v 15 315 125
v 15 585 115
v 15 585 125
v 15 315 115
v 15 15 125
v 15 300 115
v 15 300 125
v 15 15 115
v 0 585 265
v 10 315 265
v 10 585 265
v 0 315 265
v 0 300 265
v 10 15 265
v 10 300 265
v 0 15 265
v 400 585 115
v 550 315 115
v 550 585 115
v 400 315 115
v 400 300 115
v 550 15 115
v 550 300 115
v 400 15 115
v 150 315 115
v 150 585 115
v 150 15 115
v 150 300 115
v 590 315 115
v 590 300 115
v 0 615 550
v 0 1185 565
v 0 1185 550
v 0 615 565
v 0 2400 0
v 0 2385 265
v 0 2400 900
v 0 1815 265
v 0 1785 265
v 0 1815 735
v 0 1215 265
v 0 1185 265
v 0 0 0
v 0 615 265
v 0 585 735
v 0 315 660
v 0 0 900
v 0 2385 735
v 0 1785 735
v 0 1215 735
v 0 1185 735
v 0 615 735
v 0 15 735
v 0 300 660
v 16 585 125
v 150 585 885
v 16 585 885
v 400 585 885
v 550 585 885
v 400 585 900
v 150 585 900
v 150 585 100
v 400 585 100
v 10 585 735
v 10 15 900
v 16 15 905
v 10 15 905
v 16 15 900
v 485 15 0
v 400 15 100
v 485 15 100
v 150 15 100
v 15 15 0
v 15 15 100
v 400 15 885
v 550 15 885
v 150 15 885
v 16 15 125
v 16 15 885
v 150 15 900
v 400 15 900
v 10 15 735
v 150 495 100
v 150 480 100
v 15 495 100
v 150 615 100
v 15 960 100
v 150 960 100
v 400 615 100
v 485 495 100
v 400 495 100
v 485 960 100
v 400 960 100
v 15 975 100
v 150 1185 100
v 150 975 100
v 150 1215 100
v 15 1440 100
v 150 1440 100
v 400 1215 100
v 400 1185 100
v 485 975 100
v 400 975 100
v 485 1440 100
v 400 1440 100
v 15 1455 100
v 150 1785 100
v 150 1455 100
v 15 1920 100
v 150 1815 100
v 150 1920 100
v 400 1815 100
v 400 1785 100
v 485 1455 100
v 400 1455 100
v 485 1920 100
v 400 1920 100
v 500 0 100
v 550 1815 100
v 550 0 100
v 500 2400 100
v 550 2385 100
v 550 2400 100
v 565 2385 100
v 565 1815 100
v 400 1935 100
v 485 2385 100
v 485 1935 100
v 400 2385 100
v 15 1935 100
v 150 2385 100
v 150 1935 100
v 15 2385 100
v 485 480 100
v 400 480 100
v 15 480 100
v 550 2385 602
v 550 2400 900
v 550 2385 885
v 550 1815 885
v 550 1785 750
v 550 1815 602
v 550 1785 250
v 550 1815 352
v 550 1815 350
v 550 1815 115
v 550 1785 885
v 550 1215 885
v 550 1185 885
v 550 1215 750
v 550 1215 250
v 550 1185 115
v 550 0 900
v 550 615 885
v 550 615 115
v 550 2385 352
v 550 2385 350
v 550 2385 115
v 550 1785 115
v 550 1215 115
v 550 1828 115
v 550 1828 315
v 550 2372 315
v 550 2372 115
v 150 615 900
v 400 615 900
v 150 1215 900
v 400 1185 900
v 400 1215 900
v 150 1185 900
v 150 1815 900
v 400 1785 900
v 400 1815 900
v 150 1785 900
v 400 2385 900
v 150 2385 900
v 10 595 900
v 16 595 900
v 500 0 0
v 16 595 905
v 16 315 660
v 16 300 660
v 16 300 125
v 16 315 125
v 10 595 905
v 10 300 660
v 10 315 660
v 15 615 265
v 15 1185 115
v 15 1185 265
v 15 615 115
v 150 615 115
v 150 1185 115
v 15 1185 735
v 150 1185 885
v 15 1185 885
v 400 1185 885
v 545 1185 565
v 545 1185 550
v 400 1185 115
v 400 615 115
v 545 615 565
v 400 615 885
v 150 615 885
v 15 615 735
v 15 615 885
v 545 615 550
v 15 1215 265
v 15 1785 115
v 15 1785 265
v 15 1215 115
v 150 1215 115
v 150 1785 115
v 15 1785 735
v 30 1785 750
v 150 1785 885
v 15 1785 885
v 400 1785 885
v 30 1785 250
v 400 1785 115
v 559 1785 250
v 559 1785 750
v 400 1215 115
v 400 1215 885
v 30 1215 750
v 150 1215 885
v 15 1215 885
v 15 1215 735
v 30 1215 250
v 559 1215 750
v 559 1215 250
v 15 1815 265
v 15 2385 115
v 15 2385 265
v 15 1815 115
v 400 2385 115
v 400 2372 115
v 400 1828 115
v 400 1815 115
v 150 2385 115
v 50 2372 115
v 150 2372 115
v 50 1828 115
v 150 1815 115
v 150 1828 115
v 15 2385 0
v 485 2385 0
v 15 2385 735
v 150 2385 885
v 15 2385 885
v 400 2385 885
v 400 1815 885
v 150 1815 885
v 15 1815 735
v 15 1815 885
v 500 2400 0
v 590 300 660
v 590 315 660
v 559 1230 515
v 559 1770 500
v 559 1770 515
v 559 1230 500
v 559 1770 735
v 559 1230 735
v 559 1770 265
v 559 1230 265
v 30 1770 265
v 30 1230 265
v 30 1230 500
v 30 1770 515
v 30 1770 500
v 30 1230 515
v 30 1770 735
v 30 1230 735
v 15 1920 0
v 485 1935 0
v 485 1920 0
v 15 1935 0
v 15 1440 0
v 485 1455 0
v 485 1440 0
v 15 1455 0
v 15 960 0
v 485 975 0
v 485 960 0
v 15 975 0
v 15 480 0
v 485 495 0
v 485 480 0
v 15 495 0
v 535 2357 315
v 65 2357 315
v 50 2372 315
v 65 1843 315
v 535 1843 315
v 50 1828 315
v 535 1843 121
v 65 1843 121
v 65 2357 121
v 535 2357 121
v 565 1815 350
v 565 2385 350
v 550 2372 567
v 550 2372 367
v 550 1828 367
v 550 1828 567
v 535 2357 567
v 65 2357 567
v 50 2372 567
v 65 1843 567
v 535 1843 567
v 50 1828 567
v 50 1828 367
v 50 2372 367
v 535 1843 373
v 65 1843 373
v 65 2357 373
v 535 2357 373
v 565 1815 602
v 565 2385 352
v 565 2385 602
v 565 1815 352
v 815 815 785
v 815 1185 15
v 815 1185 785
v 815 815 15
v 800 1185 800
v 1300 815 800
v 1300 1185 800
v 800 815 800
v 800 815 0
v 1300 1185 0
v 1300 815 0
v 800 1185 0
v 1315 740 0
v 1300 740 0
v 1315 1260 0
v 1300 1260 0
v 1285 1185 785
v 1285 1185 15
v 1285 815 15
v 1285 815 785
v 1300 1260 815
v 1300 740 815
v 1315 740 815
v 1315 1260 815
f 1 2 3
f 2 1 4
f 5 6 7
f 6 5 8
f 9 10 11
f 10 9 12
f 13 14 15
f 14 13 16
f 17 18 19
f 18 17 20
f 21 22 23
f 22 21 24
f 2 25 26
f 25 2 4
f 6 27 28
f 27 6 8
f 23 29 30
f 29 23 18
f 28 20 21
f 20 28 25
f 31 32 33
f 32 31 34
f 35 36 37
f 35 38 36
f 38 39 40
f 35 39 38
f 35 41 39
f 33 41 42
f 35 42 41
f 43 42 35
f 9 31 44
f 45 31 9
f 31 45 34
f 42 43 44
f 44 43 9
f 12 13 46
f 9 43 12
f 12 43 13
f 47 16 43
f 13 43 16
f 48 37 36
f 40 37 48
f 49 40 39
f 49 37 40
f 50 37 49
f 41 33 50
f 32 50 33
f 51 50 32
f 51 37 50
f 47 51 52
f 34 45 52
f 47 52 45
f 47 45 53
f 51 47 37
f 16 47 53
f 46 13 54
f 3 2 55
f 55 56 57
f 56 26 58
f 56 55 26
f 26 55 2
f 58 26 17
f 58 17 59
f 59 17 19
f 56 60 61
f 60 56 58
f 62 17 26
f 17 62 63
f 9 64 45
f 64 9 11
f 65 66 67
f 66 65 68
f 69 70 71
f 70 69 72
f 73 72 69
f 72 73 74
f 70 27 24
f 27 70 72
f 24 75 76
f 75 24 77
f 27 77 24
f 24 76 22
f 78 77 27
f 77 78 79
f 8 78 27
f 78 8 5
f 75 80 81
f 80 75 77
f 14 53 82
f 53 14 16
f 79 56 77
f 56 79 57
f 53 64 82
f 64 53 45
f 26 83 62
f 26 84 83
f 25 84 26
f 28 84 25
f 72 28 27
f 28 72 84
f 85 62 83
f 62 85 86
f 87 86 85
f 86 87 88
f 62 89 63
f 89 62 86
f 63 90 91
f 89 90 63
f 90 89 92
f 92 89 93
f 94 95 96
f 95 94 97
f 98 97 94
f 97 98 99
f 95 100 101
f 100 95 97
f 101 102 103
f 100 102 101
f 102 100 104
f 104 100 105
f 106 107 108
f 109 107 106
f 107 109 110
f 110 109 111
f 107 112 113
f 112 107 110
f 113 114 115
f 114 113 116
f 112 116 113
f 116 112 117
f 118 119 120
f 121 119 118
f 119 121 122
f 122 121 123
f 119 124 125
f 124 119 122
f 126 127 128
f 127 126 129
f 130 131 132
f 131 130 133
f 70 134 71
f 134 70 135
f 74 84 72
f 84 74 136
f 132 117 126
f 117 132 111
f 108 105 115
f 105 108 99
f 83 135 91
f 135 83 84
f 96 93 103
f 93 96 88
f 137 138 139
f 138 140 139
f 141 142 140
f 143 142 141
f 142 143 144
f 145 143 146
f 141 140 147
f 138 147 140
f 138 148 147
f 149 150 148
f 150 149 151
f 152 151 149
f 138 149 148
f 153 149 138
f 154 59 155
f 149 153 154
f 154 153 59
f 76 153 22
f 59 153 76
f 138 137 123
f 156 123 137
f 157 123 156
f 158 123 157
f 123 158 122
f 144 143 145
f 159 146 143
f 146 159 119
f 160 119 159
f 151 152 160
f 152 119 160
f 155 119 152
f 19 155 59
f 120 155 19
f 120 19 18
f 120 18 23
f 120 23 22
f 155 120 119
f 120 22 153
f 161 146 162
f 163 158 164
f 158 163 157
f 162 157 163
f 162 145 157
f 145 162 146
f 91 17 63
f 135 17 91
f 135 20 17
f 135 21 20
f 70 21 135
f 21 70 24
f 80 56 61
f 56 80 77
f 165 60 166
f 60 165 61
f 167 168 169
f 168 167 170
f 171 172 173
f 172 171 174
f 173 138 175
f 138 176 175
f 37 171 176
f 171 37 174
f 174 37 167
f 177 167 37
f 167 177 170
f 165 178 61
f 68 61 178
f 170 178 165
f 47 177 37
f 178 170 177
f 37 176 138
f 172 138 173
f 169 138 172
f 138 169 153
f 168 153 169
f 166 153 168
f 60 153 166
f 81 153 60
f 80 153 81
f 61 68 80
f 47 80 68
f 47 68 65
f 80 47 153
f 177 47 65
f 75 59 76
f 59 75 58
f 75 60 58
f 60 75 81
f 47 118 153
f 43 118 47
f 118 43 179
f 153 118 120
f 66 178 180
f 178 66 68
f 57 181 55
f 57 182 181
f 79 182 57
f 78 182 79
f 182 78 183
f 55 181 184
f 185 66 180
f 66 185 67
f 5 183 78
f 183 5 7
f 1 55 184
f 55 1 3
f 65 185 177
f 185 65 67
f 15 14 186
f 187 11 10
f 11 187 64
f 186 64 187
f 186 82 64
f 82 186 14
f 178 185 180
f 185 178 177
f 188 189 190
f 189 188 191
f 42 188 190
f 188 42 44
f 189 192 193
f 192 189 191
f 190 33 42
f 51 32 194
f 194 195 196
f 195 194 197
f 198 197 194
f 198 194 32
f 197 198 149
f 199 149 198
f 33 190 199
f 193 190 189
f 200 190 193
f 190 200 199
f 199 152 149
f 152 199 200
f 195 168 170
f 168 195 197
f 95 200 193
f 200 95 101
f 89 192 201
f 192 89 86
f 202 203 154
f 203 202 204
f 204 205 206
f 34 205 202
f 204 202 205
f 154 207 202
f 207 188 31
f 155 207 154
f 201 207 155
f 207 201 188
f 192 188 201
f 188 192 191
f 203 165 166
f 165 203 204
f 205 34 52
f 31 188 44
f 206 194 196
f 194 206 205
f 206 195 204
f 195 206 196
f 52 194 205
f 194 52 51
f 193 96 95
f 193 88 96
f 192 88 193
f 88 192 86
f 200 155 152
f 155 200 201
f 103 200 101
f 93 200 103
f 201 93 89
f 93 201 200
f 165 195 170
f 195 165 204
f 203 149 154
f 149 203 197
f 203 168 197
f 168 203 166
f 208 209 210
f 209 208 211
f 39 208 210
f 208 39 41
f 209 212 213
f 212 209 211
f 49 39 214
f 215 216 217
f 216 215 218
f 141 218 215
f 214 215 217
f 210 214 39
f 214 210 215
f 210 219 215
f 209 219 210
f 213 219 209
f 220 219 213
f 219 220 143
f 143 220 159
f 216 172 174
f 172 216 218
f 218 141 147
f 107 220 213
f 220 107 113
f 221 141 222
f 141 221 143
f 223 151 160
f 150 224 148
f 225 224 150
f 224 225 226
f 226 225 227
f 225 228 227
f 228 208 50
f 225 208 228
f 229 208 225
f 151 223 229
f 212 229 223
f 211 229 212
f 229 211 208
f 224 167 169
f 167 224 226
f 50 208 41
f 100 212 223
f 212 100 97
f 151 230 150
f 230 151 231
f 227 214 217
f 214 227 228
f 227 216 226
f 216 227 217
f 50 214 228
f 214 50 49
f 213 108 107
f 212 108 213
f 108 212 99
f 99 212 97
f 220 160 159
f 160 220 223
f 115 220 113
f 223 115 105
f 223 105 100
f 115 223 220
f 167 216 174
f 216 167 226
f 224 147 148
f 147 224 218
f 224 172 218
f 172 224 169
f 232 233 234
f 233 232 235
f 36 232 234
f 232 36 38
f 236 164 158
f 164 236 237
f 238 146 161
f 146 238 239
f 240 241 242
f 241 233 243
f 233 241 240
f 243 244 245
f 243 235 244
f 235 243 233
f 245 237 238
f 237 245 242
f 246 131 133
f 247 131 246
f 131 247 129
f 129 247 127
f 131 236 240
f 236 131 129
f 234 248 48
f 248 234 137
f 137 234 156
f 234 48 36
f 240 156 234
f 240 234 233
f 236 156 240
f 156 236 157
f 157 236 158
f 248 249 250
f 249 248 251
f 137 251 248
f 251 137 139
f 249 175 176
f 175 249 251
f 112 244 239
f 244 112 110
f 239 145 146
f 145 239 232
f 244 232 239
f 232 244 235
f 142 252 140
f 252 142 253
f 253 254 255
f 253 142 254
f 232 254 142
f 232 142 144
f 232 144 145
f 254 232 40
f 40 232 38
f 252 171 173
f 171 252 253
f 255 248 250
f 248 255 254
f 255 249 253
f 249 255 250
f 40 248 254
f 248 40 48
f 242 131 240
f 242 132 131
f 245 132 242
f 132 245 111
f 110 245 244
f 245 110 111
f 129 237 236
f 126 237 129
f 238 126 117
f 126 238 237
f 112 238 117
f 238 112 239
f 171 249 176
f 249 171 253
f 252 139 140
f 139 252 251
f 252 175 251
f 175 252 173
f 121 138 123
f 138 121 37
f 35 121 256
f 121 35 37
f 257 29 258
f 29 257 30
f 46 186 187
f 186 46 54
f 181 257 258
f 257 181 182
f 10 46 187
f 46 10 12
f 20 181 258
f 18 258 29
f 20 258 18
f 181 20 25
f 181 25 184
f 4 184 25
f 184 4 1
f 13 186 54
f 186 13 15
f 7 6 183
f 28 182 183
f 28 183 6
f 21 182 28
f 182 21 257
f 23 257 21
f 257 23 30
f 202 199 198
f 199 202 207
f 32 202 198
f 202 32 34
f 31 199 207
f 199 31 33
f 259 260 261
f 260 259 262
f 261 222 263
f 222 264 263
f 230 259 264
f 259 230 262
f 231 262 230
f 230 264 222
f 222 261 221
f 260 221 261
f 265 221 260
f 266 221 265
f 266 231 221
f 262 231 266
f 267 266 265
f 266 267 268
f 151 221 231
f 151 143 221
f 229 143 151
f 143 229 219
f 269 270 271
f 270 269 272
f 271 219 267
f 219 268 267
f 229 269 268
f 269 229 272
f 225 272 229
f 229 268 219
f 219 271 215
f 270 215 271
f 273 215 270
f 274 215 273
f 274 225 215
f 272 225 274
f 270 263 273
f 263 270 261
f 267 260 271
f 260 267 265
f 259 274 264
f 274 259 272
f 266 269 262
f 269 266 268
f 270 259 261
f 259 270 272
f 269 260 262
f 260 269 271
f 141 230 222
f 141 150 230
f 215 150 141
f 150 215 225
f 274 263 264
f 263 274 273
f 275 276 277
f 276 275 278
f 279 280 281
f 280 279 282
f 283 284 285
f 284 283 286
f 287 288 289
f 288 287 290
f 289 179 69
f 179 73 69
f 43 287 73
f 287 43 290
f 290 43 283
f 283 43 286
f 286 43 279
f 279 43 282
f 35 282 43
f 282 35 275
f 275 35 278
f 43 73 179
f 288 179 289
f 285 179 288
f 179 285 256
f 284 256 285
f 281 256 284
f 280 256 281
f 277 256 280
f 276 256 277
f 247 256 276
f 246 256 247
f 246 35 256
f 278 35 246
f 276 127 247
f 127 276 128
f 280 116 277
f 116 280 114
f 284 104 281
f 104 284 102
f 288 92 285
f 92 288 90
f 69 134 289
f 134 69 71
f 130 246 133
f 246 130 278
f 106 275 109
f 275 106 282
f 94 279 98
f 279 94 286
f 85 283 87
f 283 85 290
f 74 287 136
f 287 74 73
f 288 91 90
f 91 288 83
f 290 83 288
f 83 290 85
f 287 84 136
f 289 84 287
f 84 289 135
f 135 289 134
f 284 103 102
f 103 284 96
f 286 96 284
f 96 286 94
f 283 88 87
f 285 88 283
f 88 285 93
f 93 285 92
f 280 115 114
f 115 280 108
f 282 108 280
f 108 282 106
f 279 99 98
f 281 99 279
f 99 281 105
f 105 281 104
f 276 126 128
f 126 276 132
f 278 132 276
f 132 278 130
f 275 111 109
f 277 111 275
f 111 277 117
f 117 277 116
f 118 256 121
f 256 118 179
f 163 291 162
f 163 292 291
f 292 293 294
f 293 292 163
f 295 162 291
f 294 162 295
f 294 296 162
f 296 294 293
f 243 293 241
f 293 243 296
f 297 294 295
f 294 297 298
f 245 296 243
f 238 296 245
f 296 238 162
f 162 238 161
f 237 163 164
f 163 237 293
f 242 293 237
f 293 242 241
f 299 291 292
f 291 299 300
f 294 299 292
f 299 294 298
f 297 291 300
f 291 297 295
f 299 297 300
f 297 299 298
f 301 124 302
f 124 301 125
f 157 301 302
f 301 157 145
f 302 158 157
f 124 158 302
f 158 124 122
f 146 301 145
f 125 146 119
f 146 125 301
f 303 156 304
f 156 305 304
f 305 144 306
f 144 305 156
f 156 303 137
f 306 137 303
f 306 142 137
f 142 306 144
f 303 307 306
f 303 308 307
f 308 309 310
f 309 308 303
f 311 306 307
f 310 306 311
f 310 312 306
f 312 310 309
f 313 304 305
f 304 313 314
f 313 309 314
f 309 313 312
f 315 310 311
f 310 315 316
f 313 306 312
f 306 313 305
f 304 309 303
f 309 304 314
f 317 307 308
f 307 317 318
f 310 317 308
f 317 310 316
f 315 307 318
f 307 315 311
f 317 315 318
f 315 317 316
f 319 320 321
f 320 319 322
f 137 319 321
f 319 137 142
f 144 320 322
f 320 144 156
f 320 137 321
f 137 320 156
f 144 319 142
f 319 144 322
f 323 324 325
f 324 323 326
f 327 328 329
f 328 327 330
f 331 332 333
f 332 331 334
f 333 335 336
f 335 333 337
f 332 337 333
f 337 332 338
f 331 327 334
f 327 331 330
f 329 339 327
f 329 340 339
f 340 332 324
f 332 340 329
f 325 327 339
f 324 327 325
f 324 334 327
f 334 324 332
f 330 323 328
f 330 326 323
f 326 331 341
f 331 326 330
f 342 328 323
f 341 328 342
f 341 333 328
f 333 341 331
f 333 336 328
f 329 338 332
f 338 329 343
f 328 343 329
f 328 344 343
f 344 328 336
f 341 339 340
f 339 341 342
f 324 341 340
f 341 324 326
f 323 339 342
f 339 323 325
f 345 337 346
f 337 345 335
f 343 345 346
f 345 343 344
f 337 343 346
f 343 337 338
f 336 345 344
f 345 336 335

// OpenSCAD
// modulo = [
//    ancho, alto, profundidad,
//    refuerzo, esqueleto, fondo, espesor,
//    color, [x,y,z], nombre
//]

// puerta = [moduloIndex, cant, espesor, 
//    color, [x,y,z]], nombre
//]

// cajon = [ moduloIndex, alto, color,
//    frenteDec, altoDec, anchoPlus,
//    colorDec, [x,y,z], nombre
//]

module tableroX(ancho=100, alto=100, 
                espesor=15, posicion, color, parte, agrupador = 0 ){ 
    if(is_num(ancho) && is_num(alto) && is_num(espesor)){
        
        if (posicion == "lateral"){  //-- lateral
            cube([ancho, espesor, alto]);       
        }else if(posicion == "fondo"){ //-- frente
            cube([espesor, ancho, alto]);
        }else if(posicion == "frente"){ //-- frente
            cube([espesor, ancho, alto]);
        }else if(posicion == "techo"){ //-- piso
            cube([alto, ancho, espesor]);
        }else if(posicion == "piso"){ //-- piso
            cube([alto, ancho, espesor]);
        }
 
    }else{ echo("No es numero!!!!!"); }
//    echo("tablero", posicion, 1, ancho," x ",alto,
//    espesor, color, parte);
    
    habilitado="true";
    conBanda=color; sinBanda=""; 
    conAluminio="aluminio";
    sinAluminio="";
    
  if (! (parte == "Pared" || 
    parte == "Pilar" || 
    parte == "Frizer" || 
    parte == "Cocina")
  ){
    if((espesor > 10) && 
        (posicion == "piso" 
        || posicion == "techo"
        || posicion == "fondo")){
       echo(alto," ",
        ancho," -- ",
        1,color, 
        str(parte,"_",agrupador,"_",posicion),
        habilitado,
        sinBanda,sinBanda,
        conBanda,sinBanda);
    }else if(espesor < 10 && 
        (posicion == "piso" 
        || posicion == "techo"
        || posicion == "fondo")){
       echo(alto," ",
        ancho," ",
        1,"Fondo 6", 
        str(parte,"_",agrupador,"_",posicion),
        habilitado,
        sinBanda,sinBanda,
        sinBanda,sinBanda); 
        }
    if(posicion == "lateral"){
        echo(alto," -- ",
        ancho," == ",
        1,color,
        str(parte,"_",agrupador,"_",posicion),
        habilitado,
        conBanda,sinBanda,
        conBanda,conBanda);
    }
    if(posicion == "frente" && 
        parte == "Cajón"){
        echo(alto," == ",
        ancho," == ",
        1,color,    
        str(parte,"_",agrupador,"_",posicion),
        habilitado,
        conAluminio,conAluminio,
        sinAluminio,conAluminio);
    }
    if(posicion == "frente" && 
        parte == "Puerta"){
        echo(alto," == ",
        ancho," == ",
        1,color,    
        str(parte,"_",agrupador,"_",posicion),
        habilitado,
        conAluminio,sinAluminio,
        conAluminio,conAluminio);
    }
  }
}

module armariodeModulo(armario){
    
    //echo(armario[8]);
//armario_00 = [moduloIndex, ancho, alto, profundidad,
//            espesor, color, divisiones, [x,y,z]];    
            
    espacio = armario[2]/(armario[6]-1);  t=0;
    translate(armario[7]) color(armario[5])
    union(){
    tableroX(ancho=armario[3],
            alto=armario[2],
            espesor=armario[4],
            posicion="lateral",
            color=armario[5],
            parte=armario[8]);
    translate ([0,armario[1]-(armario[4]),0])
    tableroX(ancho=armario[3],
            alto=armario[2],
            espesor=armario[4],
            posicion="lateral",
            color=armario[5],
            parte=armario[8]);
    for ( n = [0 : armario[6]-2] ){
        translate ([0,armario[4],t])
        tableroX(ancho=armario[1]-(armario[4]*2),
                alto=armario[3],
                espesor=armario[4],
                posicion="piso",
                color=armario[5],
                parte=armario[8]);
        t= n*espacio;
    }
    translate ([0,armario[4],armario[2]-armario[4]])
    tableroX(ancho=armario[1]-(armario[4]*2),
            alto=armario[3],
            espesor=armario[4],
            posicion="piso",
            color=armario[5],
            parte=armario[8]);
    }
}

module socalo(Socalo){
    rotate([0,270,-90])
    armariodeModulo(Socalo);
}

// modulo = [
//    ancho, alto, profundidad,
//    refuerzo, esqueleto, fondo, espesor,
//    color, [x,y,z], nombre
//]

module modularX(anchoMod, altoMod, profundoMod, 
    refuerzo, esqueleto, fondo, espesor, color,
    agrupador){

    altoRefuerzoFrente=50;
    altoRefuerzo = 150;
    anchoFondo=anchoMod-(espesor*2);
    PLat_1=[0,0,0];
    PLat_2=[0,anchoMod-espesor,0];
    PFondo=[0,espesor,espesor];
    PFrente=[profundoMod-espesor,
        espesor,
        altoMod-altoRefuerzoFrente-espesor];
    PPiso=[0,espesor,0];
    PTech=[0,espesor,altoMod-espesor];
    
    union(){
        //--Lateral 1
        translate(PLat_1)
        tableroX(ancho=profundoMod,
            alto=altoMod,
            espesor=espesor,
            posicion="lateral", 
            color=color,
            parte="Modular",
            agrupador=agrupador);        
        //--Lateral 2
        translate(PLat_2)
        tableroX(ancho=profundoMod,
            alto=altoMod,
            espesor=espesor,
            posicion="lateral", 
            color=color,
            parte="Modular",
            agrupador=agrupador);
        //--Frente
        if(refuerzo=="Si"){
            translate(PFrente)
            tableroX(ancho=anchoFondo,
                alto=altoRefuerzoFrente,
                espesor=espesor,
                posicion="frente", 
                color=color,
                parte="Modular",
                agrupador=agrupador);
        }
        //refuerzoF = "No"; refuerzoTP = "No";
//        if(profundoMod > (altoRefuerzo*2)){
//            refuerzoTP = "Si";}
//        if(altoMod > (altoRefuerzo*2)){
//            refuerzoF = "Si";}
        if(esqueleto=="No"){
            //--Fondo
            //if(refuerzoTP == "Si"){
            translate(PFondo) 
            tableroX(ancho=anchoFondo,
                alto=altoRefuerzo,
                espesor=espesor,
                posicion="fondo", 
                color=color,
                parte="Modular",
                agrupador=agrupador);
            translate(PFondo) 
            translate([0,0,altoMod-altoRefuerzo-espesor*2])
            tableroX(ancho=anchoFondo,
                alto=altoRefuerzo,
                espesor=espesor,
                posicion="fondo", 
                color=color,
                parte="Modular",
                agrupador=agrupador);
            //}
            //-- Piso 
            translate(PPiso)
            tableroX(ancho=anchoFondo,
                alto=profundoMod,
                espesor=espesor,
                posicion="piso", 
                color=color,
                parte="Modular",
                agrupador=agrupador);
            //-- techo
            translate(PTech)
            tableroX(ancho=anchoFondo,
                alto=profundoMod,
                espesor=espesor,
                posicion="techo", 
                color=color,
                parte="Modular",
                agrupador=agrupador);
        }
        if(esqueleto == "Si"){ 
        //--Fondo
//            if(refuerzoF == "Si"){
            translate(PFondo) 
            tableroX(ancho=anchoFondo,
                alto=altoRefuerzo,
                espesor=espesor,
                posicion="fondo", 
                color=color,
                parte="Modular",
                agrupador=agrupador);
            translate(PFondo) 
            translate([0,0,altoMod-altoRefuerzo-espesor*2]) 
            tableroX(ancho=anchoFondo,
                alto=altoRefuerzo,
                espesor=espesor,
                posicion="fondo", 
                color=color,
                parte="Modular",
                agrupador=agrupador);
//            }
            //-- Piso
            translate(PPiso)
            tableroX(ancho=anchoFondo,
                alto=altoRefuerzo,
                espesor=espesor,
                posicion="piso", 
                color=color,
                parte="Modular",
                agrupador=agrupador);
                
                translate(PPiso) 
            translate([profundoMod-altoRefuerzo,0,0]) 
            tableroX(ancho=anchoFondo,
                alto=altoRefuerzo,
                espesor=espesor,
                posicion="techo", 
                color=color,
                parte="Modular",
                agrupador=agrupador);
                
            //-- techo
            translate(PTech) 
            tableroX(ancho=anchoFondo,
                alto=altoRefuerzo,
                espesor=espesor,
                posicion="techo", 
                color=color,
                parte="Modular",
                agrupador=agrupador);
            translate(PTech) 
            translate([profundoMod-altoRefuerzo,0,0]) 
            tableroX(ancho=anchoFondo,
                alto=altoRefuerzo,
                espesor=espesor,
                posicion="techo", 
                color=color,
                parte="Modular",
                agrupador=agrupador);
        }
        //En caso de requerir un fondo en el mueble
        if(fondo == "Si"){
            translate(PFondo) 
            translate([espesor-5,0,
                        espesor-5]) 
            tableroX(
              ancho=anchoMod-(espesor+5),
              alto=altoMod-(espesor+5),
                espesor=6,
                posicion="fondo", 
                color=color,
                parte="Modular",
                agrupador=agrupador);    
        }
    }
}

module modulosdeCocina(Modulos){
                            
    // Ensamblado de modulos
    if (len(Modulos) > 0){
        for(i=[0:(len(Modulos)-1)]){
//            echo(str("Modular ",i), 
//            str("Ancho ", Modulos[i][0]),    
//            str("Alto ", Modulos[i][1]),
//            str("Profundidad ", Modulos[i][2]),  
//            str("Nombre ", Modulos[i][9]));
            
            translate(Modulos[i][8]) 
            rotate([0,0,0])
            color(Modulos[i][7])        
            modularX(anchoMod=Modulos[i][0], 
                altoMod=Modulos[i][1], 
                profundoMod=Modulos[i][2], 
                refuerzo=Modulos[i][3],    
                esqueleto=Modulos[i][4],
                fondo=Modulos[i][5],
                espesor=Modulos[i][6],
                color=Modulos[i][7],
                agrupador=i
            );
        }
    }
}

module puertasdeModulo(Puertas){
    // Ensamblado de puertas  
    if (len(Puertas) > 0){   
        for(i=[0:len(Puertas)-1]){
            translate(Puertas[i][6]) 
            color(Puertas[i][5])
            tableroX(ancho=Puertas[i][1],
                alto=Puertas[i][2],
                espesor=Puertas[i][4],
                posicion="frente",
                color=Puertas[i][5],
                parte="Puerta",
                agrupador=i);
        }
    }
}

module cajonX(anchoCajon, altoCajon,
            profundoCajon, espesor, 
            color="green",frente="No",
            altoFrente, anchoPlus,
            colorFrente= "red", agrupador){

            anchoFondo=anchoCajon-(espesor*2);
        
//    //union(){
        //--Lateral 1
        translate([0,0,0]) color(color)
        tableroX(ancho=profundoCajon,
            alto=altoCajon,
            espesor=espesor,
            posicion="lateral", 
            color=color,
            parte="Cajón",
            agrupador=agrupador);
        //--Lateral 2
        translate([0,anchoCajon-espesor,0]) color(color)
        tableroX(ancho=profundoCajon,
            alto=altoCajon,
            espesor=espesor,
            posicion="lateral", 
            color=color,
            parte="Cajón",
            agrupador=agrupador);
              //--Fondo 
        translate([0,espesor,0]) color(color)
        tableroX(ancho=anchoCajon-espesor*2,
            alto=altoCajon,
            espesor=espesor,
            posicion="fondo", 
            color=color,
            parte="Cajón",
            agrupador=agrupador);
        //--Frente
        translate([profundoCajon-espesor,espesor,0]) color(color)
        tableroX(ancho=anchoCajon-espesor*2,
            alto=altoCajon,
            espesor=espesor,
            posicion="fondo", 
            color=color,
            parte="Cajón",
            agrupador=agrupador);
        //-- Piso 
        translate([espesor,espesor,0]) color(color)
        tableroX(
            ancho=anchoCajon-(espesor+5),
            alto=profundoCajon-(espesor+5),
            espesor=6,
            posicion="piso", 
            color=color,
            parte="Cajón",
            agrupador=agrupador);     
    if(frente == "Si"){
      // Frente decorativo
      translate([profundoCajon,(anchoCajon-anchoPlus)/2,-espesor])
        color(colorFrente)
      tableroX(ancho=anchoPlus,
            alto=altoFrente,
            espesor=espesor,
            posicion="frente", 
            color=colorFrente,
            parte="Cajón",
            agrupador=agrupador);
    }
}

module cajonY(anchoCajon, altoCajon, profundoCajon, 
            espesor, color="green",frente="No",
            altoFrente, anchoPlus,colorFrente= "red"){

            anchoFondo=anchoCajon-(espesor*2);
        
        //--Fondo 
        translate([0,espesor,0]) color(color)
        tableroX(ancho=anchoCajon-espesor*2,
            alto=altoCajon,
            espesor=espesor,
            posicion="fondo", 
            color=color,
            parte="Cajón");
        //--Frente
        translate([profundoCajon-espesor,espesor,0]) color(color)
        tableroX(ancho=anchoCajon-espesor*2,
            alto=altoCajon,
            espesor=espesor,
            posicion="fondo", 
            color=color,
            parte="Cajón");
        //-- Piso 
        translate([espesor,espesor,0]) color(color)
        tableroX(
            ancho=anchoCajon-espesor*2,
            alto=profundoCajon-espesor*2,
            espesor=espesor,
            posicion="piso", 
            color=color,
            parte="Cajón");     
       // Techo
       translate([espesor,espesor,altoCajon-espesor]) color(color)
        tableroX(
            ancho=anchoCajon-espesor*2,
            alto=profundoCajon-espesor*2,
            espesor=espesor,
            posicion="piso", 
            color=color,
            parte="Cajón");     
            
    if(frente == "Si"){
      // Frente decorativo
      translate([profundoCajon,(anchoCajon-anchoPlus)/2,0])
        color(colorFrente)
      tableroX(ancho=anchoPlus,
            alto=altoFrente,
            espesor=espesor,
            posicion="frente", 
            color=colorFrente,
            parte="Cajón");
    }
}


// cajon_00 = [moduloIndex, ancho, alto, profundidad,
//          espesor, color, frenteDec, anchoDec, altoDec, 
//          colorDec, [x,y,z]]
module cajonesdeModulo(Cajones){
    
    // Ensamblado de cajones
    for(i=[0:len(Cajones)-1]){
//        echo(str("Cajón ",i), 
//        str("Ancho ",Cajones[i][1]),
//        str("Alto ",Cajones[i][2]),
//        str("Profundidad ",Cajones[i][3]));
        
        translate (Cajones[i][10])  
        cajonX(
            anchoCajon=Cajones[i][1], 
            altoCajon=Cajones[i][2], 
            profundoCajon=Cajones[i][3], 
            espesor=Cajones[i][4],
            color=Cajones[i][5],
            frente=Cajones[i][6],
            altoFrente=Cajones[i][8],
            anchoPlus=Cajones[i][7],
            colorFrente=Cajones[i][9],
            agrupador=i);
    }
}

module divHorizontal(Divisiones){
     
    for(i=[0:len(Divisiones)-1]){
        translate(Divisiones[i][6]) 
        color(Divisiones[i][5])
        tableroX(
          ancho=Divisiones[i][1],
            alto=Divisiones[i][2],
            espesor=Divisiones[i][4],
            posicion="piso",
            color=Divisiones[i][5],
            parte="Division");
    }   
}


module divisiones(Divisiones){     
    for(i=[0:len(Divisiones)-1]){
        translate(Divisiones[i][6]) 
        color(Divisiones[i][5])
        tableroX(
          ancho=Divisiones[i][1],
            alto=Divisiones[i][2],
            espesor=Divisiones[i][4],
            posicion=Divisiones[i][8],
            color=Divisiones[i][5],
            parte="Division");
    }   
}

/////////////////////////////////////
espesor = 15; riel = 13;
socalo = 100;
// modulo(i) = [
//    ancho, alto, profundidad,
//    refuerzo, esqueleto, fondo, espesor,
//    color, [x,y+sum(modulo(i..i-1)[ancho]),z], nombre
//]

mod_00 = [600,800,550,"No","Si","Si",espesor,"red",
         [0,0,socalo], "Modulo 1"];
mod_01 = [600,800,550,"No","Si","No",espesor,"red",
         [0,mod_00[0],socalo], "Modulo 2"];
mod_02 = [600,800,550,"No","Si","No",espesor,"red",
         [0,mod_00[0]+mod_01[0],socalo], "Modulo 3"];
mod_03 = [600,800,550,"No","Si","No",espesor,"red",
         [0,mod_00[0]+mod_01[0]+mod_02[0],socalo], "Modulo 4"];

ModulosX = [mod_00, mod_01, mod_02, mod_03];

// puerta = [moduloIndex, ancho, alto, cant, espesor, 
//    color, [x,y,z]], nombre
//]

puerta_00 = [0,mod_00[0]-10,mod_00[1]-10,1,espesor,"green",
            [mod_00[8][0]+mod_00[2],
                mod_00[8][1]+5,
                mod_00[8][2]], 
            "puerta 1"];
puerta_01 = [1,mod_01[0]-10,mod_01[1]-10,1,espesor,"green",
            [mod_01[8][0]+mod_01[2],
                mod_01[8][1]+5,
                mod_01[8][2]], 
            "puerta 2"];
PuertasX = [
        puerta_00, puerta_01
    ];

div_00 = [0,mod_00[0]-10,mod_00[2]-5,1,espesor,"green",
            [mod_00[8][0],
                mod_00[8][1]+mod_00[0]/2,
                mod_00[8][2]+15], 
            "division 1",
            "lateral"];
div_01 = [1,mod_01[0]-10,mod_01[2]-5,1,espesor,"green",
            [mod_01[8][0],
                mod_01[8][1]+5,
                mod_01[8][2]+450], 
            "division 2",
            "piso"];
Divisiones = [
            div_00, div_01
];

//armario_00 = [moduloIndex, ancho, alto, profundidad,
//            espesor, color, divisiones, [x,y,z]];

armario_00 = [2, mod_02[0]-espesor*2, 500, mod_02[2]-espesor-6,
            espesor, "white", (1+2),
            [mod_02[8][0]+espesor*2,
                mod_02[8][1]+espesor,
                mod_02[8][2]+150],
            "Armario 1"];

socalo_00 = [0, 500, 2400, socalo,
            espesor, "white", (4+2),
            [0,0,0],
            "Socalo 1"];

// cajon_00 = [moduloIndex, ancho, alto, profundidad,
//          espesor, color, frenteDec, anchoDec, altoDec, 
//          colorDec, [x,y,z]]


cajon_00 = [3, mod_03[0]-espesor*2-riel*2, 200, mod_03[2]-50,
          espesor, "blue", "Si", mod_03[0]-espesor*2, 
          250,"green", 
          [mod_03[8][0]+50,
            mod_03[8][1]+espesor+riel,
            mod_03[8][2]+espesor]];
cajon_01 = [3, mod_03[0]-espesor*2-riel*2, 200, mod_03[2]-50,
          espesor, "blue", "Si", mod_03[0]-espesor*2, 
          250,"green", 
          [mod_03[8][0]+50,
            mod_03[8][1]+espesor+riel,
            mod_03[8][2]+espesor+250+2]];

CajonesX = [
    cajon_00, cajon_01
];

//CajonY = [anchoCajon=400, altoCajon=800, 
//            profundoCajon=500, 
//            espesor=15, color="green",
//            frente="Si",
//            altoFrente=815, anchoPlus=520,
//            colorFrente= "red"];

CajonY_01 = [400, 800, 
            500, 
            15, "green",
            "Si",
            815, 520,
            "red"];
modulosdeCocina(ModulosX);

//puertasdeModulo(PuertasX);
divisiones(Divisiones); 
armariodeModulo(armario_00);

socalo(socalo_00);

cajonesdeModulo(CajonesX);

//translate([15,15,0])
//cylinder(h=1100, d=30, $fn=40);

translate([800,800,0])


cajonY(CajonY_01[0],CajonY_01[1],CajonY_01[2],
        CajonY_01[3],CajonY_01[4],CajonY_01[5],
        CajonY_01[6],CajonY_01[7],CajonY_01[8]
        );
